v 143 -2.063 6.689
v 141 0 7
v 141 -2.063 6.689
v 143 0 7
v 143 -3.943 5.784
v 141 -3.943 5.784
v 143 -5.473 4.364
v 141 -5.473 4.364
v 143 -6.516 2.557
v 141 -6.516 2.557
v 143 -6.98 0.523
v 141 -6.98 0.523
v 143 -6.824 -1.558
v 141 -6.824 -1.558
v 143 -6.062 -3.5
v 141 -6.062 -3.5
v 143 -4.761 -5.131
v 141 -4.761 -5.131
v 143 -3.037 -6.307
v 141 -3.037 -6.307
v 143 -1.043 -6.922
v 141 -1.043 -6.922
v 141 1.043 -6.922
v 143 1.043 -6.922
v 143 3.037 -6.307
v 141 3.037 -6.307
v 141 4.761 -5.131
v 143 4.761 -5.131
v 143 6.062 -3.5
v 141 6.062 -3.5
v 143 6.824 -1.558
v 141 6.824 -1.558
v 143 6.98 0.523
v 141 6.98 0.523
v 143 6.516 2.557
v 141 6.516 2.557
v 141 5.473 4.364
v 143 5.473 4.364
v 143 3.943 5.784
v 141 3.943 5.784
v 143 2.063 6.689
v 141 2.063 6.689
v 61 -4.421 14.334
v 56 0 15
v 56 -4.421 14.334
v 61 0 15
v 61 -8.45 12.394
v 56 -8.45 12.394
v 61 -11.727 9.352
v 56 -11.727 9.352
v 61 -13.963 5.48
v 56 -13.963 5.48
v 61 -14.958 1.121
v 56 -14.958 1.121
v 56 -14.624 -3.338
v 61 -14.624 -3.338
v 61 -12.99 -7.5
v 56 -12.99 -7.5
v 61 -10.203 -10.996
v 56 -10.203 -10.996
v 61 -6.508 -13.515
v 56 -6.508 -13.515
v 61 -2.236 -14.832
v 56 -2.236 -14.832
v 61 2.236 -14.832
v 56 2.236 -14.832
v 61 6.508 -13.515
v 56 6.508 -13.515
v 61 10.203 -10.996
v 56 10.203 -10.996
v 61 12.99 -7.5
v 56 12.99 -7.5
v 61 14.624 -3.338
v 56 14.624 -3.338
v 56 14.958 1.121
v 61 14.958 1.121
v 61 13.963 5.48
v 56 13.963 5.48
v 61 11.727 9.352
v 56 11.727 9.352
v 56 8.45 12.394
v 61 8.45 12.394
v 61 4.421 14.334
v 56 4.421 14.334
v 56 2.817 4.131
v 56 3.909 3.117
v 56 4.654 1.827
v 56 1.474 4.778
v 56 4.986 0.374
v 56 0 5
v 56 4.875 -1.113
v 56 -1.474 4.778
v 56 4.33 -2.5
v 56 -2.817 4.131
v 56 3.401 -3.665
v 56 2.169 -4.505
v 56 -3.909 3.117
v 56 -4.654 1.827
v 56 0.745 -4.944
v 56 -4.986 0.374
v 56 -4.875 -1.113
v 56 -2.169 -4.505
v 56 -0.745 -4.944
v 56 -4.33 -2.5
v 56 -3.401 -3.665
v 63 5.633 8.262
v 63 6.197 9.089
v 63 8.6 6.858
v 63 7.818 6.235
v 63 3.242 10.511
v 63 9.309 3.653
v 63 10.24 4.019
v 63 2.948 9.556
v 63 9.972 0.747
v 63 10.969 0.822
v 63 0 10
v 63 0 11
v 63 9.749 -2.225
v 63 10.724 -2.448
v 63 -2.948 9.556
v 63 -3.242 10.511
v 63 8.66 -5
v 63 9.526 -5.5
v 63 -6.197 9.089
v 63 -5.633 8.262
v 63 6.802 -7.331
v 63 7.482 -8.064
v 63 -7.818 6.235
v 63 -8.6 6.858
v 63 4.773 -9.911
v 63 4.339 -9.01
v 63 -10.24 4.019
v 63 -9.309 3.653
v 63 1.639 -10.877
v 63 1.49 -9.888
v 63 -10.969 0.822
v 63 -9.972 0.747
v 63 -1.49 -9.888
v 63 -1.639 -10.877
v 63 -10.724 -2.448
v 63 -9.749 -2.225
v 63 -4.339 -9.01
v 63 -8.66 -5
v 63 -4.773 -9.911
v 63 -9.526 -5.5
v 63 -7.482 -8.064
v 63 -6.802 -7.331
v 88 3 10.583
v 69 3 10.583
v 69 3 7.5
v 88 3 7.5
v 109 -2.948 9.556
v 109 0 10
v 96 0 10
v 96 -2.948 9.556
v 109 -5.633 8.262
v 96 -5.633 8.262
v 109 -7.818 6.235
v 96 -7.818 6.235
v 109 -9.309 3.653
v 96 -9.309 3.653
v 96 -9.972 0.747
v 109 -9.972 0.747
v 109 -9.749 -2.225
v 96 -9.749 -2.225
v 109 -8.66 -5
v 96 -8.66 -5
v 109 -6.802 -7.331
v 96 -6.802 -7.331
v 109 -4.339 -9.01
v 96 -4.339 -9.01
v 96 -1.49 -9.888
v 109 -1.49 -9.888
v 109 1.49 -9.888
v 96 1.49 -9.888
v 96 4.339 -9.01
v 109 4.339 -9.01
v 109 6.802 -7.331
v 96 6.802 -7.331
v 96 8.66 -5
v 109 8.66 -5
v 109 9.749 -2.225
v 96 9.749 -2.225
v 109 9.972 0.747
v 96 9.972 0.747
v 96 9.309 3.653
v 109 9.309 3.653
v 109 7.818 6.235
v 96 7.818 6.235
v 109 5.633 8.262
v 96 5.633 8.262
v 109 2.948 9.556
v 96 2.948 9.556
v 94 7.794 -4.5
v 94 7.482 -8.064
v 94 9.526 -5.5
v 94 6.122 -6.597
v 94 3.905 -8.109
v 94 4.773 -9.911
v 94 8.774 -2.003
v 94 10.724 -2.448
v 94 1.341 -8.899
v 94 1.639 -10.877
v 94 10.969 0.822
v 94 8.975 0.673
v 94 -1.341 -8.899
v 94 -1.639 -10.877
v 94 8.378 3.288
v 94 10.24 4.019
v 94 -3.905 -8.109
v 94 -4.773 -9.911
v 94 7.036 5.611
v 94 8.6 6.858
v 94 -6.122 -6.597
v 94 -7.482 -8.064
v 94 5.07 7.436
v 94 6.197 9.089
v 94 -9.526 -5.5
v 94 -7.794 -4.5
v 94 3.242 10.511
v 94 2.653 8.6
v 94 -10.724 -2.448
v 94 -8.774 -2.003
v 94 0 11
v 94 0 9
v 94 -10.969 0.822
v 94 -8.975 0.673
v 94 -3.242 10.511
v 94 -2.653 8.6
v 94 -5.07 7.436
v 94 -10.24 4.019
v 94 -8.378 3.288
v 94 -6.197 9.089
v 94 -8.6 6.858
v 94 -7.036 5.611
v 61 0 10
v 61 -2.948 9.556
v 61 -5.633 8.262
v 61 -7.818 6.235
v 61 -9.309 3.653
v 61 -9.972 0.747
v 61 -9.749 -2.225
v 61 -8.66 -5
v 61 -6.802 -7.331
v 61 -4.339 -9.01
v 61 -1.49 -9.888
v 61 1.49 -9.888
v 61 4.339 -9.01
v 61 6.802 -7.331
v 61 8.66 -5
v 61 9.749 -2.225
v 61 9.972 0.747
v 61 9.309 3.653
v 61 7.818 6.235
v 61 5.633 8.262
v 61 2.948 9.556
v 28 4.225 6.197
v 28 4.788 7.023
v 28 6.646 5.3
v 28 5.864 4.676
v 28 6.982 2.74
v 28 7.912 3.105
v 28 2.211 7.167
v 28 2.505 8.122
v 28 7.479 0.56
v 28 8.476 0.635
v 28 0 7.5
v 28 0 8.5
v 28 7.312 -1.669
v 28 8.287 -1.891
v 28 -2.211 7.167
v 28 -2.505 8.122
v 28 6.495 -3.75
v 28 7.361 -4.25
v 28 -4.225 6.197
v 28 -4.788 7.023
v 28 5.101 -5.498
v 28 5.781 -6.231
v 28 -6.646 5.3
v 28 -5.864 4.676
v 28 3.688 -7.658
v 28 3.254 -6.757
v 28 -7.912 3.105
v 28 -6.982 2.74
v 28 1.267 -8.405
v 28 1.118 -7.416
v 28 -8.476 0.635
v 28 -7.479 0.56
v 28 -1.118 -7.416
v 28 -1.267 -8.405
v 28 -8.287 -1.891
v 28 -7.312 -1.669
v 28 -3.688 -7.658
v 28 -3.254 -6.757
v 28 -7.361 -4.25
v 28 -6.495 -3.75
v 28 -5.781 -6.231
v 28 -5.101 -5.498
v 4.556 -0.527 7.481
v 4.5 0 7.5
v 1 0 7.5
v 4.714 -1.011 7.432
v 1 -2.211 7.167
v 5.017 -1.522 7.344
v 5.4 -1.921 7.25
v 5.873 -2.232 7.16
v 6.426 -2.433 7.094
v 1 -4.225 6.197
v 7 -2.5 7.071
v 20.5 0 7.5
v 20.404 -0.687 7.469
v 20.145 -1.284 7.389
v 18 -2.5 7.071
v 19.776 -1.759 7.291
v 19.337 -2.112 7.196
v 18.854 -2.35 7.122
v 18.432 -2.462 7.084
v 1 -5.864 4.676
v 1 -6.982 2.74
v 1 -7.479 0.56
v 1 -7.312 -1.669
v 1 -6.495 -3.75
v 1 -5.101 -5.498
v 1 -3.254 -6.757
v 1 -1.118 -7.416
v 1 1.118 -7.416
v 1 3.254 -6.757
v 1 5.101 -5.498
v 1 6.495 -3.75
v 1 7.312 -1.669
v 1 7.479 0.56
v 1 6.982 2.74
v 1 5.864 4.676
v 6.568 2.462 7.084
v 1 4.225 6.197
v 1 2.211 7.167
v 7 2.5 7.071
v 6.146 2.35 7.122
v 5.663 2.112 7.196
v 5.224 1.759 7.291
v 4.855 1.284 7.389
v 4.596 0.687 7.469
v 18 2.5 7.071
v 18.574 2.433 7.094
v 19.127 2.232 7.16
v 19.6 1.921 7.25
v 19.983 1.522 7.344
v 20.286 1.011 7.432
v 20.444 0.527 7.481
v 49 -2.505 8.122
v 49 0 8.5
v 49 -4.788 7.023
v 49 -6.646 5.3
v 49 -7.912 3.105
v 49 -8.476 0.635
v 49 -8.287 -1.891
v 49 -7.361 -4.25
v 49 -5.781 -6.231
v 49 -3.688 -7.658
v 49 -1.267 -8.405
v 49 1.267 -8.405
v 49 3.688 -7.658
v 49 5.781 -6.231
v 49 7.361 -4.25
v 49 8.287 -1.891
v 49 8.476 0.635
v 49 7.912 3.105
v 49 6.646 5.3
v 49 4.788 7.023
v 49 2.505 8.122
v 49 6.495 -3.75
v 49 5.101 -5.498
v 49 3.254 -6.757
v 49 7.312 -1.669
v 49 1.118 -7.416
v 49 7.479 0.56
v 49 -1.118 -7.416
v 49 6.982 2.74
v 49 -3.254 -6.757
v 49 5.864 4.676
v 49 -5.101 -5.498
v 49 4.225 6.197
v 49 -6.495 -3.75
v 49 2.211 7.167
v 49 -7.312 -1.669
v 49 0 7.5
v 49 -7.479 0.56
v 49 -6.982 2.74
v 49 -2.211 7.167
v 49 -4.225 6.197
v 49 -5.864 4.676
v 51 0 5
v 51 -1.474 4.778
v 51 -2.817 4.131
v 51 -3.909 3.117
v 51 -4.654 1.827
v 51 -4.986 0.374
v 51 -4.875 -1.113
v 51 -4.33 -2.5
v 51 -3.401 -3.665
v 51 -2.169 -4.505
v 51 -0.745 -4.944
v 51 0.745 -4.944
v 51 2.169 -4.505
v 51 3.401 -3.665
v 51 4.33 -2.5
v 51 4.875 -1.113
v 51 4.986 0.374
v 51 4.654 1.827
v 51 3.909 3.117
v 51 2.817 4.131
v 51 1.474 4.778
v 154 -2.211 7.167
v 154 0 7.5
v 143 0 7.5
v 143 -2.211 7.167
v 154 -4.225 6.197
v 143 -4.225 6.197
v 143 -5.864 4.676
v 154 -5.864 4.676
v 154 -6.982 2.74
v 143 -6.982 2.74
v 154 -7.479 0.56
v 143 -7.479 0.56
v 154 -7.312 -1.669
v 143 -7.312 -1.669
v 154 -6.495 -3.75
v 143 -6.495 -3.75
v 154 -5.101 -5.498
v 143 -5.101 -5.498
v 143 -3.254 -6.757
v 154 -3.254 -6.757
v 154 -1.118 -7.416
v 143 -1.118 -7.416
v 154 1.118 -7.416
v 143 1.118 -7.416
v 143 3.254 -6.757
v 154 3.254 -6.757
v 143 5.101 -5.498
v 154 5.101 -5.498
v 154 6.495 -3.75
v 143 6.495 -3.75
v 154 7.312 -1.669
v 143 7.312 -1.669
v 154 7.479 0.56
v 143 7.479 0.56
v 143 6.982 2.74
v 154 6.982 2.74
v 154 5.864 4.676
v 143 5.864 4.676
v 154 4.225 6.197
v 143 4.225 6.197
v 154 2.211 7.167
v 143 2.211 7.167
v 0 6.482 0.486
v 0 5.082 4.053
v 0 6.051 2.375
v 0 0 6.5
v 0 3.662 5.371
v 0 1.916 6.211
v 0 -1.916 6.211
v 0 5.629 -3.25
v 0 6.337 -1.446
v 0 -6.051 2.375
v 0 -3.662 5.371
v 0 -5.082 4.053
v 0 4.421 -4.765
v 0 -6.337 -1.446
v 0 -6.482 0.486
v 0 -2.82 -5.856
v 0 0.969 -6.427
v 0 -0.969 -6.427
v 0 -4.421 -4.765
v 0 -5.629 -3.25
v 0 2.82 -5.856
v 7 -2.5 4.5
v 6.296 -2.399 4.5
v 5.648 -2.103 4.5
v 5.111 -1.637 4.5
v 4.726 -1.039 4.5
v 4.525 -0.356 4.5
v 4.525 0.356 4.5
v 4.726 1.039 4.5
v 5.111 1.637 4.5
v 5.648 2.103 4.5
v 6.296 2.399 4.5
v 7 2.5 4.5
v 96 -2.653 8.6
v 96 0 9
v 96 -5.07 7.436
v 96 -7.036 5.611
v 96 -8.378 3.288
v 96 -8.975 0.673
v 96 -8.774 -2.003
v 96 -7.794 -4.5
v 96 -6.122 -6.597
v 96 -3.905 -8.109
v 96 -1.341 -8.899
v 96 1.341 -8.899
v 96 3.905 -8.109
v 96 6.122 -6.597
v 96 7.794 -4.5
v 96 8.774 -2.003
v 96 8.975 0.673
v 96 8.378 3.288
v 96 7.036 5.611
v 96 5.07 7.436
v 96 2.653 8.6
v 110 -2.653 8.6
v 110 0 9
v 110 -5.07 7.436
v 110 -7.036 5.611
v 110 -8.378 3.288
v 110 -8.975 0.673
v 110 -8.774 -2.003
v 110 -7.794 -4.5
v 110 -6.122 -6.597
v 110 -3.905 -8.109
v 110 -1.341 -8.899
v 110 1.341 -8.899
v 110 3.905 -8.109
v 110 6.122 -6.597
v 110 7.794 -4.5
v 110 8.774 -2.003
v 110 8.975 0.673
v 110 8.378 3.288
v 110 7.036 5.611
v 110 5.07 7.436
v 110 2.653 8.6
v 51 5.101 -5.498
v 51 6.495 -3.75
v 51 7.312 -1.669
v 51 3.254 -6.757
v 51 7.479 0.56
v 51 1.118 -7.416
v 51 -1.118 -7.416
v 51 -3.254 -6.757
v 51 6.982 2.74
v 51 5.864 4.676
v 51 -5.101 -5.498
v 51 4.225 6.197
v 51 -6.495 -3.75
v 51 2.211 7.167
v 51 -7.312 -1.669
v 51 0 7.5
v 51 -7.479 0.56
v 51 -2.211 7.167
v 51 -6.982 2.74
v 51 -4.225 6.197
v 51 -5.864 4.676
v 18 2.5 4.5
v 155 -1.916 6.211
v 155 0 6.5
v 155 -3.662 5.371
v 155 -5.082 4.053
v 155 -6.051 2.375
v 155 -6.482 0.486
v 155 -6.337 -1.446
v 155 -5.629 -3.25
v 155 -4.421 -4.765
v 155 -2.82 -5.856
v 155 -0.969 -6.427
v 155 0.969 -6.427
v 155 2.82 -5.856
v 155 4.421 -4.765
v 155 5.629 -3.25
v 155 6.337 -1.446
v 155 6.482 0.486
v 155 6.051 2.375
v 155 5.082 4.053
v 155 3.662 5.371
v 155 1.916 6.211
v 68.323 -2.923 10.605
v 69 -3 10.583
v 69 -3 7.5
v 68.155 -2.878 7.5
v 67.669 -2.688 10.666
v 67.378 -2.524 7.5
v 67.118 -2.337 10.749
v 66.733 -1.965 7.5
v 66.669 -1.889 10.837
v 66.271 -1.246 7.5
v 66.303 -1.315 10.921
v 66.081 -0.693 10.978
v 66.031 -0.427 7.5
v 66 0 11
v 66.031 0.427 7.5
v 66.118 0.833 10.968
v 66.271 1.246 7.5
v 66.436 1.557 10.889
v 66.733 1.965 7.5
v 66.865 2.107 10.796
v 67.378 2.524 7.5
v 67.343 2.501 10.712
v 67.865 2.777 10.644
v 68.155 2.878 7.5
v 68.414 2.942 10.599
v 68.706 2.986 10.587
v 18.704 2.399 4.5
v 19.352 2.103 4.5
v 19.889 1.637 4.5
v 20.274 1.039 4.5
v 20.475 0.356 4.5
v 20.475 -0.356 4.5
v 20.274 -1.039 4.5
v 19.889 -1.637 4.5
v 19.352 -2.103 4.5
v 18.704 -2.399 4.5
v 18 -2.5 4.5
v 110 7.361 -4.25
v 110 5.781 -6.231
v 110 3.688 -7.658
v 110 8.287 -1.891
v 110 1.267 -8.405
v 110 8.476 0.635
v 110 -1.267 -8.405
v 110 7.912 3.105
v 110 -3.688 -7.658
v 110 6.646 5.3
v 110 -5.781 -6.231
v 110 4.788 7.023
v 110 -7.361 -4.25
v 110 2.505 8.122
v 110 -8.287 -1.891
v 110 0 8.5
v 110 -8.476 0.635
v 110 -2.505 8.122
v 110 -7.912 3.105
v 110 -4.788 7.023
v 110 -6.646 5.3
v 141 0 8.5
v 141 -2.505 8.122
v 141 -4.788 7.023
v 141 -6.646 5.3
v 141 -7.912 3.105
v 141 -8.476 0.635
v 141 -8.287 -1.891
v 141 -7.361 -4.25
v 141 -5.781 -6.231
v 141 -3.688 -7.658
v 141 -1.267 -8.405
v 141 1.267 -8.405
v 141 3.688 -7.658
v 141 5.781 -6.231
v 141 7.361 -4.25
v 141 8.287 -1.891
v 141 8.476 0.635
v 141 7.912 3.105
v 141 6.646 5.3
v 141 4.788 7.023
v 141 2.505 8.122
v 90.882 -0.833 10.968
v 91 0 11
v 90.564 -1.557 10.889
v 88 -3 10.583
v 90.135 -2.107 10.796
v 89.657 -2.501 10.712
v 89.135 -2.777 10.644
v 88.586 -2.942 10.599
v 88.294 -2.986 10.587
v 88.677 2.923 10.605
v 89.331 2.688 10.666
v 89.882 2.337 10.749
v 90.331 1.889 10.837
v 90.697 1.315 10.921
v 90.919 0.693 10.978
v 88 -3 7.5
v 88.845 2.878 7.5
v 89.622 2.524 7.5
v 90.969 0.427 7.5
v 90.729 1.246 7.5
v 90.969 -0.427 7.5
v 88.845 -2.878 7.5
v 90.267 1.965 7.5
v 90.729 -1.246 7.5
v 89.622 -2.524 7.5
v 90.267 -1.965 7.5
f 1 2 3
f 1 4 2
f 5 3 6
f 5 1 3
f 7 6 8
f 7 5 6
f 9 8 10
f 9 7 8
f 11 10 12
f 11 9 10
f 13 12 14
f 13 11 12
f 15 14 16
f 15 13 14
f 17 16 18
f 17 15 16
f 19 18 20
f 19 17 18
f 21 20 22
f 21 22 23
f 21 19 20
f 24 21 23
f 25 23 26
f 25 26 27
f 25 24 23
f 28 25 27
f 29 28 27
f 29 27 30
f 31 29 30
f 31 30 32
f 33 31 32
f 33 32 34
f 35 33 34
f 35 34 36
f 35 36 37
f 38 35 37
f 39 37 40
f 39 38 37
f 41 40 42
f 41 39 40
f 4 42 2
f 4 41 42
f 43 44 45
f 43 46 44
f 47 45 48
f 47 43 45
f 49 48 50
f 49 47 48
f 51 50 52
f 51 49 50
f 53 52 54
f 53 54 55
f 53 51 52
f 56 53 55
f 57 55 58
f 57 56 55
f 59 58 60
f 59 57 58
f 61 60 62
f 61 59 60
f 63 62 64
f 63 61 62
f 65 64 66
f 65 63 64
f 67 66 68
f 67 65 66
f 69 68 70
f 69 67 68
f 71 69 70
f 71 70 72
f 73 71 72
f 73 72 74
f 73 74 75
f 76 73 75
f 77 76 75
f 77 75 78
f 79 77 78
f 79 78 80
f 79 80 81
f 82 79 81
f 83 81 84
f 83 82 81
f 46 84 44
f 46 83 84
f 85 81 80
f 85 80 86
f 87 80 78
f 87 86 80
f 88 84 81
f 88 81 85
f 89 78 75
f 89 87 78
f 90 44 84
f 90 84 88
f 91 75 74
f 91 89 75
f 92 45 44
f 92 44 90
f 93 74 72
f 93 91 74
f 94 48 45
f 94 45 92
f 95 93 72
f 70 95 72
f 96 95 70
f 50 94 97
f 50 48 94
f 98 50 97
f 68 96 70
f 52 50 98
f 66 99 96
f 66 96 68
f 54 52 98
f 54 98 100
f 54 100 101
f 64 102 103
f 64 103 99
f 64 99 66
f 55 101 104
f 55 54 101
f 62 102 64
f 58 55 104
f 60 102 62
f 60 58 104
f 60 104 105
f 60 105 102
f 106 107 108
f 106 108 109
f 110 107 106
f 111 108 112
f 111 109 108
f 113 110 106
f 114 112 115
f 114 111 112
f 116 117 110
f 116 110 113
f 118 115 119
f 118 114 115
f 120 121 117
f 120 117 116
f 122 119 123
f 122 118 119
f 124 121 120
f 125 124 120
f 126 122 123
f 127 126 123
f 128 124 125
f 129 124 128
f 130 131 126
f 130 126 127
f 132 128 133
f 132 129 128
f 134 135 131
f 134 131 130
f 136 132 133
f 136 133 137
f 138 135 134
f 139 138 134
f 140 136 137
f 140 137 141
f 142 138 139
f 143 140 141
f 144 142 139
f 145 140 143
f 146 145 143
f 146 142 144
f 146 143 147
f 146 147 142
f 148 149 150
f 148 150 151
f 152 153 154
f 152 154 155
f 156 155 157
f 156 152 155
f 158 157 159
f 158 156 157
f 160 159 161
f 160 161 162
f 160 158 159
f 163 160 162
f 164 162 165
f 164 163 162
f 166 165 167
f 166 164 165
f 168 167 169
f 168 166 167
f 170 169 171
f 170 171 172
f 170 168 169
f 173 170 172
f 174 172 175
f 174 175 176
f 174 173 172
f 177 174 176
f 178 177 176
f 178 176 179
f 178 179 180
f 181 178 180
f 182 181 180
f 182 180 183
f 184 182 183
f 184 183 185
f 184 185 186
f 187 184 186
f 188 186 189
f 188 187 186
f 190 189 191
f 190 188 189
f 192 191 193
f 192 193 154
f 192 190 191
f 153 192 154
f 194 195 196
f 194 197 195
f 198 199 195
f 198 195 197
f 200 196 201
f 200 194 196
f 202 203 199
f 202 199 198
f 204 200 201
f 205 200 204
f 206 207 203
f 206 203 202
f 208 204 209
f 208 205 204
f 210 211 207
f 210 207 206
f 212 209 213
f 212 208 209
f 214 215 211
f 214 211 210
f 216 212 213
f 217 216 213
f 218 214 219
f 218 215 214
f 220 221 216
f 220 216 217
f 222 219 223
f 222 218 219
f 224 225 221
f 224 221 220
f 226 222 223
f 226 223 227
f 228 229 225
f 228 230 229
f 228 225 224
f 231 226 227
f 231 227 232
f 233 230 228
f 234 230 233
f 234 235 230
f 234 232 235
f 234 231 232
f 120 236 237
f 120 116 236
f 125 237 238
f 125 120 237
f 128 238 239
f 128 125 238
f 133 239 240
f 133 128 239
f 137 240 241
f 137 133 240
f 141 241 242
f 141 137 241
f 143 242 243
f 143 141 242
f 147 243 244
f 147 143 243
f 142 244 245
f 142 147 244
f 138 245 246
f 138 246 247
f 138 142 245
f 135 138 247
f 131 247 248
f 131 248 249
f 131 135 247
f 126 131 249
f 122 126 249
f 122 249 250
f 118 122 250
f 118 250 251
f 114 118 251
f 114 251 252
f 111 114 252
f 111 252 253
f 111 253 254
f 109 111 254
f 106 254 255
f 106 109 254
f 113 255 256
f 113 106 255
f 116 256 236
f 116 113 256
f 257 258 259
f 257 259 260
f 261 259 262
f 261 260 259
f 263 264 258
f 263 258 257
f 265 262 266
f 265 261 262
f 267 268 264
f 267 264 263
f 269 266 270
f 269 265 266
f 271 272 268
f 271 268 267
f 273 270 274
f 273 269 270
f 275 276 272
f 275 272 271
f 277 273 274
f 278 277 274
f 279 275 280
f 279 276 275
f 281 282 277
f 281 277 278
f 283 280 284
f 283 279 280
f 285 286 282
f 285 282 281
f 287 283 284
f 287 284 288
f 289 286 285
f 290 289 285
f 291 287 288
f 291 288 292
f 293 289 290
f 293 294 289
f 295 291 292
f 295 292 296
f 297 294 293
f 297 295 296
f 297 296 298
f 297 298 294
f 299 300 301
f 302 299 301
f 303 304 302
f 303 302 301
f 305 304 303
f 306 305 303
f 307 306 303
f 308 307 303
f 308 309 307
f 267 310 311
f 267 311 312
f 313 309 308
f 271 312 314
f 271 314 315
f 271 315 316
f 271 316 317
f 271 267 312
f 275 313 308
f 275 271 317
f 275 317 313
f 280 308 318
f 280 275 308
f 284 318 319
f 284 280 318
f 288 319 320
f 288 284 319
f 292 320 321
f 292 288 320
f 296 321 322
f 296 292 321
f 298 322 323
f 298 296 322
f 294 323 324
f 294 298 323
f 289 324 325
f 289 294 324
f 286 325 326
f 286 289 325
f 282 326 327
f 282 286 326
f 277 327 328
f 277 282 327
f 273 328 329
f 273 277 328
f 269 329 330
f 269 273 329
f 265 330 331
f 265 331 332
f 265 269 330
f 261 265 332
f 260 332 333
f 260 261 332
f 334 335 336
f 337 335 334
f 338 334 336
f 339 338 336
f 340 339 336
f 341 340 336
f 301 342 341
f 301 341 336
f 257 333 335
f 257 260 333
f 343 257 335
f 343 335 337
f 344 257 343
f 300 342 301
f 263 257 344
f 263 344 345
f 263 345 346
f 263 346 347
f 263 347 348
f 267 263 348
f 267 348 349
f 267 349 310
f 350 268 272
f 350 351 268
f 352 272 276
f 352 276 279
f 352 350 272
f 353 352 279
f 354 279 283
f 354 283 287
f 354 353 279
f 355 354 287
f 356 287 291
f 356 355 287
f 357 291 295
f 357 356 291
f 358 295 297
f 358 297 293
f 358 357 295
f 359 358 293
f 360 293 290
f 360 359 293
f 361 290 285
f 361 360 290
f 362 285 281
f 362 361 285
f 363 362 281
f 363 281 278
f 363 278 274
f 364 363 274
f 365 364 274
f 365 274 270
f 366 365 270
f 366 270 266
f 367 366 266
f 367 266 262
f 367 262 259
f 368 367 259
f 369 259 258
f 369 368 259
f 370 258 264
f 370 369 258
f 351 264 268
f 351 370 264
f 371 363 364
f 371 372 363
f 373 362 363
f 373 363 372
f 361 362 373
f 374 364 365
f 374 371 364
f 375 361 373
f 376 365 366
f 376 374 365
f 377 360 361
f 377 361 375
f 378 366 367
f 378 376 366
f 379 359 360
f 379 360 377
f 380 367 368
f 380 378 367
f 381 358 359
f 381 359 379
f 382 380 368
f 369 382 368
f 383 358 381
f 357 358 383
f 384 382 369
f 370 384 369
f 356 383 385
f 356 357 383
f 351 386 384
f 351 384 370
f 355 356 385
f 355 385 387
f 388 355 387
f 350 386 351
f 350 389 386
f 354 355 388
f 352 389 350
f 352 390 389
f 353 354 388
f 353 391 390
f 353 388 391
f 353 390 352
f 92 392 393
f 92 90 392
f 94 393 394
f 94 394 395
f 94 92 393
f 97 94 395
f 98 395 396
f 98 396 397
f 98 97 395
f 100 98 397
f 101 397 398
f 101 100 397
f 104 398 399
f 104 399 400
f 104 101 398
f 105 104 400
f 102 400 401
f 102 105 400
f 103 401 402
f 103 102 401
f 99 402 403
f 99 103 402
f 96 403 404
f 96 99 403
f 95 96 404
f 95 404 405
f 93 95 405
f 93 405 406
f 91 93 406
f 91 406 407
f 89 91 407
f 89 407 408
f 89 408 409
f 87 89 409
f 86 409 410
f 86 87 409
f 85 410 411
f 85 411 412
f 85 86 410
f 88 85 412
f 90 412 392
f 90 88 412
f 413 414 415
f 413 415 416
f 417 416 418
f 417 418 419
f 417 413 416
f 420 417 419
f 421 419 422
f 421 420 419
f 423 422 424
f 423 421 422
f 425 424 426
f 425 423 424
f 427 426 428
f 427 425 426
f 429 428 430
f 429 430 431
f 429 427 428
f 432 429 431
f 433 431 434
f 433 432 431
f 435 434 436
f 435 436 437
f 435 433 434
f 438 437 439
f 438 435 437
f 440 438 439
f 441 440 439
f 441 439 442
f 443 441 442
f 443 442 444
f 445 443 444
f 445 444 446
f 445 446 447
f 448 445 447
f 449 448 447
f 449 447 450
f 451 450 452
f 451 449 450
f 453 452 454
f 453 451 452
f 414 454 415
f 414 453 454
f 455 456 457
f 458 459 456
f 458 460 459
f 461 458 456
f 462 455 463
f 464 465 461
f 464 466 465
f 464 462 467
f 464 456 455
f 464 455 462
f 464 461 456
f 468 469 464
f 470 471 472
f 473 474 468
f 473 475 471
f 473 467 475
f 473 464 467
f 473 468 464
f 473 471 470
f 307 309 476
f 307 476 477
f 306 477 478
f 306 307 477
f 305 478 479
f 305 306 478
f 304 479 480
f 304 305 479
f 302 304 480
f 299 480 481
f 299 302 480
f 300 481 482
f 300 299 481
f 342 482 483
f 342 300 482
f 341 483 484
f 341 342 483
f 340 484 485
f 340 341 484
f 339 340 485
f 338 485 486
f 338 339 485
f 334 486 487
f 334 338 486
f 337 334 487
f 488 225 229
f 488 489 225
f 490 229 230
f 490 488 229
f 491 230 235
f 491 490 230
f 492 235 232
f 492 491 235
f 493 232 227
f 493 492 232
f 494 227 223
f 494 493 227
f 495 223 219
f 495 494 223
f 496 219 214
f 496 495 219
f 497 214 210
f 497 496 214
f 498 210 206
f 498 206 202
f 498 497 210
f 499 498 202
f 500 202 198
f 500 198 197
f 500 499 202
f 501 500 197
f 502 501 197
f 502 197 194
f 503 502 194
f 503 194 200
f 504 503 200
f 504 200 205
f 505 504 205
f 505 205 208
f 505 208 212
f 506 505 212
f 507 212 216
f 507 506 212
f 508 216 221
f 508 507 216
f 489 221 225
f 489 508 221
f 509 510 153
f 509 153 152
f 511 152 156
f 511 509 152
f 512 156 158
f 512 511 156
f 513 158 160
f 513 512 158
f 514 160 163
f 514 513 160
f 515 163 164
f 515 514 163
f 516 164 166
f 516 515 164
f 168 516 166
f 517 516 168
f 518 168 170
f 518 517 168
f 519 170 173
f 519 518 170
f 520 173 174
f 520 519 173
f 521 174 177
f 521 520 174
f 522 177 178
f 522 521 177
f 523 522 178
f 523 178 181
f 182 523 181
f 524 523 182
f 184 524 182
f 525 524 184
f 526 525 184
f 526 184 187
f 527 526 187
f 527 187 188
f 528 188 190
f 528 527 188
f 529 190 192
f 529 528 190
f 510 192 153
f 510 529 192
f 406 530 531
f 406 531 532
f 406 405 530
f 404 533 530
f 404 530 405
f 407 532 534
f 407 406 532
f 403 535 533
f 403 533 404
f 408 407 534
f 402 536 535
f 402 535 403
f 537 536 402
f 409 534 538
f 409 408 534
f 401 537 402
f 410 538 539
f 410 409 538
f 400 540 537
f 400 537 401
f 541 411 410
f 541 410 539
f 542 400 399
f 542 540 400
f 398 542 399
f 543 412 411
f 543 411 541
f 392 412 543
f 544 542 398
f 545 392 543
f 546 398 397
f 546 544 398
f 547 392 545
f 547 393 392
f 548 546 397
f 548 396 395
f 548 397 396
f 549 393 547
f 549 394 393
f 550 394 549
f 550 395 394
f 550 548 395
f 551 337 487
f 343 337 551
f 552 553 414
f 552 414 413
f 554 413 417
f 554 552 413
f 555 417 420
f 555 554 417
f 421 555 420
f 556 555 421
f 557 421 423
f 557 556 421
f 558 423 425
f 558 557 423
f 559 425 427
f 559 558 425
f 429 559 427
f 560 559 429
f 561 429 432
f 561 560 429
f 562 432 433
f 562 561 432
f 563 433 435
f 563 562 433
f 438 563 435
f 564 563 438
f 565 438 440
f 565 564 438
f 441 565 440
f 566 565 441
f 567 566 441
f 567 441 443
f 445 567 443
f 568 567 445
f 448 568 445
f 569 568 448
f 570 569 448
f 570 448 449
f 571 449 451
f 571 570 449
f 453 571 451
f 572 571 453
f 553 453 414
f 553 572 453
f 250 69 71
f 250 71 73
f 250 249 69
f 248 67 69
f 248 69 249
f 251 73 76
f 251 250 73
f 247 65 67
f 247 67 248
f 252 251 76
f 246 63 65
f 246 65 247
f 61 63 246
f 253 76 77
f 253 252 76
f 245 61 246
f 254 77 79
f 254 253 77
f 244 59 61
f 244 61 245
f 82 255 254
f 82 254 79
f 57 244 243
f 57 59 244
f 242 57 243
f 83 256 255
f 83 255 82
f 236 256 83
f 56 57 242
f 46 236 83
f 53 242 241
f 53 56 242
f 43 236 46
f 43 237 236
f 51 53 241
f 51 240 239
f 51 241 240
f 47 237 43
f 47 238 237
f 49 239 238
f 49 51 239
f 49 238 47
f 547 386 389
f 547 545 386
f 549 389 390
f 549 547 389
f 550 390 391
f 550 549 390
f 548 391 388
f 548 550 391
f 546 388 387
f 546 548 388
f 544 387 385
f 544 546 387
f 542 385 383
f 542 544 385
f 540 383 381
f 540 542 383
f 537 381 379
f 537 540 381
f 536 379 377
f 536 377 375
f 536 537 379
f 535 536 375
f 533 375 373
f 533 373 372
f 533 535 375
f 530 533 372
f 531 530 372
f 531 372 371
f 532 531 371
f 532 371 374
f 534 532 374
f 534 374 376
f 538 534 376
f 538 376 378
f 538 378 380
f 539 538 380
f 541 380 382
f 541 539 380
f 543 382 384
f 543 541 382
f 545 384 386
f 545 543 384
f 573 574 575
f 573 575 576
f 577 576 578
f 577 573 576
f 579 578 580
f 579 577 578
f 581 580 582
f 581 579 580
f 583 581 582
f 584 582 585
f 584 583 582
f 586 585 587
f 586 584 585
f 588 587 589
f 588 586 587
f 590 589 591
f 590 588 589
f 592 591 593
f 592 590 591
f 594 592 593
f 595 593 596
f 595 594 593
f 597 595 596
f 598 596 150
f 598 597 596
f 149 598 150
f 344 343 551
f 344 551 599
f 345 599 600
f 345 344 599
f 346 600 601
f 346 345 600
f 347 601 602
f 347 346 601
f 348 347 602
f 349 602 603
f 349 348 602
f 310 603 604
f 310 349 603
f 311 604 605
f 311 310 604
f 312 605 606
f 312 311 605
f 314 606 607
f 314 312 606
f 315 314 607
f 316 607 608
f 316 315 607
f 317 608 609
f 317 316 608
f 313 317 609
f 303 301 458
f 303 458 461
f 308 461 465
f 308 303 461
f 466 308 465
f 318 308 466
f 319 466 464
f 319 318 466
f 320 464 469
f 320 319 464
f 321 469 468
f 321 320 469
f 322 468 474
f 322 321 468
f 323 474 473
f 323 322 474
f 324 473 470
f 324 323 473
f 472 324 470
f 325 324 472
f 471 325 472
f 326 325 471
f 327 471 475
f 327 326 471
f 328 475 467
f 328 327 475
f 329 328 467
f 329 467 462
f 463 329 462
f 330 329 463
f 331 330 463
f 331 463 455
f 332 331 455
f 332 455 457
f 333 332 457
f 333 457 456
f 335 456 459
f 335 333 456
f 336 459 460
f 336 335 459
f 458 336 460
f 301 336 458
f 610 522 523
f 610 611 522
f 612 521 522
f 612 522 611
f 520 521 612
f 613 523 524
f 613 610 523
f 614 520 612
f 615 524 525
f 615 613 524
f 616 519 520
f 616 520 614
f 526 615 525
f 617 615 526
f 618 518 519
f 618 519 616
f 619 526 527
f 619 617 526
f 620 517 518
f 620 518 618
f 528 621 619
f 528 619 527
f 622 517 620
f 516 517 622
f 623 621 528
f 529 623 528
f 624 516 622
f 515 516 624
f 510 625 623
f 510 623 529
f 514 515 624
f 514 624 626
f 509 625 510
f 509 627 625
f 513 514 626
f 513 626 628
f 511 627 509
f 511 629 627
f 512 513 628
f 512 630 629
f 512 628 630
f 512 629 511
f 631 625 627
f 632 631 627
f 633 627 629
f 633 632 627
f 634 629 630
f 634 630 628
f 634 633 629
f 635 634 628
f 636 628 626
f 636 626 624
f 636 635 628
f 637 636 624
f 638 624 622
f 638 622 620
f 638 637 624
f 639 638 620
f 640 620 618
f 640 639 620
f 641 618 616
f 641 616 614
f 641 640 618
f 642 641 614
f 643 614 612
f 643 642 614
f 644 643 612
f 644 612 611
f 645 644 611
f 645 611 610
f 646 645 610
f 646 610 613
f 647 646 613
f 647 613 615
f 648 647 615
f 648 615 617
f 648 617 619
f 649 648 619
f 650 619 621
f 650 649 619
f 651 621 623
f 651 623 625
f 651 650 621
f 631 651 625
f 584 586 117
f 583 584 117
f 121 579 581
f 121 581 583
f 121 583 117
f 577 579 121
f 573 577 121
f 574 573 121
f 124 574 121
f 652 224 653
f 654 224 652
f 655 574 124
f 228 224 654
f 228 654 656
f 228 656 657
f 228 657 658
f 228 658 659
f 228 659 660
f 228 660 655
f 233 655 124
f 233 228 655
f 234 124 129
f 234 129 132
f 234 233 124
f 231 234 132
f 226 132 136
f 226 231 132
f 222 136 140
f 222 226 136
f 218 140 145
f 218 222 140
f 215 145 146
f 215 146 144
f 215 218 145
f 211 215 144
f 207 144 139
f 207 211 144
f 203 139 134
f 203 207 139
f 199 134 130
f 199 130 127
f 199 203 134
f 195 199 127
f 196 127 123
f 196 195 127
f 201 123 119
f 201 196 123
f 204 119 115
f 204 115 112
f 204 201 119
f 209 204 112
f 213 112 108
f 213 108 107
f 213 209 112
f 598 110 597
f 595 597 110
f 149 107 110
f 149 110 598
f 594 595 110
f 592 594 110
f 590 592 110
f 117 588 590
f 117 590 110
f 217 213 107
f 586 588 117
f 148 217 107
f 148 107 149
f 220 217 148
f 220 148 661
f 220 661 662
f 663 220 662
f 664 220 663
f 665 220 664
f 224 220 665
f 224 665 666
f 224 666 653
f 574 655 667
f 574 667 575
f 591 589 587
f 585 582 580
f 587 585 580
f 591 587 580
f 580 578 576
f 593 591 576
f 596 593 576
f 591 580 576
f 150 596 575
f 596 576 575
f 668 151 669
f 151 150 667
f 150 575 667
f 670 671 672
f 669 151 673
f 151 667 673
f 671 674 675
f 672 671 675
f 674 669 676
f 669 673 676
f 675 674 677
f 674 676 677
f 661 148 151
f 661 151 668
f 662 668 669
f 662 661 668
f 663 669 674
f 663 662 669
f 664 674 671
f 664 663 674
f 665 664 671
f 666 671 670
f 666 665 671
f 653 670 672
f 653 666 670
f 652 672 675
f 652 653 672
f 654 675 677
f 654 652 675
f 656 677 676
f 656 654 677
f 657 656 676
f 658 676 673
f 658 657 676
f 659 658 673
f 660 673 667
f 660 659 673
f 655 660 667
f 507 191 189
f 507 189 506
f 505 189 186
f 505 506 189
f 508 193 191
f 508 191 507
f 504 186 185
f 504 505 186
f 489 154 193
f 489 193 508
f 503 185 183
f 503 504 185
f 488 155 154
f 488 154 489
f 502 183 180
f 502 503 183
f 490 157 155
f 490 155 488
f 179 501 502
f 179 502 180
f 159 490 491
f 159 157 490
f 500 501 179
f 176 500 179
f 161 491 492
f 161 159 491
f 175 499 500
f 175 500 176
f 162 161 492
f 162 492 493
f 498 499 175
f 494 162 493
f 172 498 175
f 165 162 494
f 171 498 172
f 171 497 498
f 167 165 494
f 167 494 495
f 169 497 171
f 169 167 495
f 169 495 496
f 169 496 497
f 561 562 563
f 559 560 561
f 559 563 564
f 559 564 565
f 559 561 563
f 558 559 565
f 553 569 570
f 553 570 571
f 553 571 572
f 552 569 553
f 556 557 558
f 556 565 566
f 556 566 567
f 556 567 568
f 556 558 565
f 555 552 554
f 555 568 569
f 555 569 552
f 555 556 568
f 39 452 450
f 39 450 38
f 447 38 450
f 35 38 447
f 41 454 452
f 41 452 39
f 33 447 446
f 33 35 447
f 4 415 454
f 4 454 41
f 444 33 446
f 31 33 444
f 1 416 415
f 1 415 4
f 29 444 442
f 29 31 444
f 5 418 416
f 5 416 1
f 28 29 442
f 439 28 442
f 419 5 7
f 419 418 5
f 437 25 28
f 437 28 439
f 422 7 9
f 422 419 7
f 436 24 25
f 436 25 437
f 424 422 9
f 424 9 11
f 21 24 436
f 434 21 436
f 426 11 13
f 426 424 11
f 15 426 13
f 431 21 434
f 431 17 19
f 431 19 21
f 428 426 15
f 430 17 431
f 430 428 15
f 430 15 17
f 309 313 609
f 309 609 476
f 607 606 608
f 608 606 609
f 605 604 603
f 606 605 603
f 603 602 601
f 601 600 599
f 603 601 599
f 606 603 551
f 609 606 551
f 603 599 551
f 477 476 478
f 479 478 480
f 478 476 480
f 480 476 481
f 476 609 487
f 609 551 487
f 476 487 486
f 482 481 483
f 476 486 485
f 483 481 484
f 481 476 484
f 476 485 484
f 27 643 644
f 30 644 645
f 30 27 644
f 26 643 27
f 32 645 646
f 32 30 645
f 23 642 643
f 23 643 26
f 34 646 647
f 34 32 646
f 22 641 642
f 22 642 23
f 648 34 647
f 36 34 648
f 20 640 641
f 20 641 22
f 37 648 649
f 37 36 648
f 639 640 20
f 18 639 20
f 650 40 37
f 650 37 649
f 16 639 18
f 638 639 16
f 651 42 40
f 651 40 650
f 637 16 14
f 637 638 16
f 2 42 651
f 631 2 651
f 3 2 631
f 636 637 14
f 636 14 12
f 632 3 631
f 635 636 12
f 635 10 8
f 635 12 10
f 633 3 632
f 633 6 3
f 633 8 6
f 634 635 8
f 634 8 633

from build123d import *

# Parameters (mm, degrees)
CUT_EXTRUDE_1_DEPTH = 3
CUT_EXTRUDE_2_DEPTH = 3.5
CHAMFER_1_SIZE      = 1


with BuildPart() as part:
    # 草图1 → 旋转1 (revolve)
    with BuildSketch(Plane.XY, mode=Mode.PRIVATE) as revolve_1_sk:
        Polygon((0, 0), (0, 7.5), (28, 7.5), (28, 8.5), (49, 8.5), (49, 7.5), (51, 7.5), (51, 5), (56, 5), (56, 15), (61, 15), (61, 10), (63, 10), (63, 11), (94, 11), (94, 9), (96, 9), (96, 10), (110, 10), (110, 8.5), (141, 8.5), (141, 7), (143, 7), (143, 7.5), (155, 7.5), (155, 0), align=None)
    revolve(revolve_1_sk.sketch.rotate(Axis((0, 0, 0), (1, 0, 0)), 90), axis=Axis((0, 0, 0), (1, 0, 0)))

    # 草图2 → 切除-拉伸1 (cut)
    with BuildSketch(Plane.XY.offset(7.5)):
        with BuildLine():
            Line((18, -2.5), (7, -2.5))
            ThreePointArc((7, -2.5), (4.5, 0), (7, 2.5))
            Line((7, 2.5), (18, 2.5))
            ThreePointArc((18, 2.5), (20.5, 0), (18, -2.5))
        make_face()
    extrude(amount=-CUT_EXTRUDE_1_DEPTH, mode=Mode.SUBTRACT)

    # 草图3 → 切除-拉伸2 (cut)
    with BuildSketch(Plane(origin=(0, 0, 11), x_dir=(-1, 0, 0), z_dir=(0, 0, 1))):
        with BuildLine():
            Line((-88, 3), (-69, 3))
            ThreePointArc((-69, 3), (-66, 0), (-69, -3))
            Line((-69, -3), (-88, -3))
            ThreePointArc((-88, -3), (-91, 0), (-88, 3))
        make_face()
    extrude(amount=-CUT_EXTRUDE_2_DEPTH, mode=Mode.SUBTRACT)

    # 倒角1
    chamfer_1_edges = [part.edges().sort_by_distance(p)[0] for p in [
        (155, 0, -7.5),
        (110, 0, -10),
        (0, 0, -7.5),
    ]]
    chamfer(chamfer_1_edges, length=CHAMFER_1_SIZE)


solid = part.part
